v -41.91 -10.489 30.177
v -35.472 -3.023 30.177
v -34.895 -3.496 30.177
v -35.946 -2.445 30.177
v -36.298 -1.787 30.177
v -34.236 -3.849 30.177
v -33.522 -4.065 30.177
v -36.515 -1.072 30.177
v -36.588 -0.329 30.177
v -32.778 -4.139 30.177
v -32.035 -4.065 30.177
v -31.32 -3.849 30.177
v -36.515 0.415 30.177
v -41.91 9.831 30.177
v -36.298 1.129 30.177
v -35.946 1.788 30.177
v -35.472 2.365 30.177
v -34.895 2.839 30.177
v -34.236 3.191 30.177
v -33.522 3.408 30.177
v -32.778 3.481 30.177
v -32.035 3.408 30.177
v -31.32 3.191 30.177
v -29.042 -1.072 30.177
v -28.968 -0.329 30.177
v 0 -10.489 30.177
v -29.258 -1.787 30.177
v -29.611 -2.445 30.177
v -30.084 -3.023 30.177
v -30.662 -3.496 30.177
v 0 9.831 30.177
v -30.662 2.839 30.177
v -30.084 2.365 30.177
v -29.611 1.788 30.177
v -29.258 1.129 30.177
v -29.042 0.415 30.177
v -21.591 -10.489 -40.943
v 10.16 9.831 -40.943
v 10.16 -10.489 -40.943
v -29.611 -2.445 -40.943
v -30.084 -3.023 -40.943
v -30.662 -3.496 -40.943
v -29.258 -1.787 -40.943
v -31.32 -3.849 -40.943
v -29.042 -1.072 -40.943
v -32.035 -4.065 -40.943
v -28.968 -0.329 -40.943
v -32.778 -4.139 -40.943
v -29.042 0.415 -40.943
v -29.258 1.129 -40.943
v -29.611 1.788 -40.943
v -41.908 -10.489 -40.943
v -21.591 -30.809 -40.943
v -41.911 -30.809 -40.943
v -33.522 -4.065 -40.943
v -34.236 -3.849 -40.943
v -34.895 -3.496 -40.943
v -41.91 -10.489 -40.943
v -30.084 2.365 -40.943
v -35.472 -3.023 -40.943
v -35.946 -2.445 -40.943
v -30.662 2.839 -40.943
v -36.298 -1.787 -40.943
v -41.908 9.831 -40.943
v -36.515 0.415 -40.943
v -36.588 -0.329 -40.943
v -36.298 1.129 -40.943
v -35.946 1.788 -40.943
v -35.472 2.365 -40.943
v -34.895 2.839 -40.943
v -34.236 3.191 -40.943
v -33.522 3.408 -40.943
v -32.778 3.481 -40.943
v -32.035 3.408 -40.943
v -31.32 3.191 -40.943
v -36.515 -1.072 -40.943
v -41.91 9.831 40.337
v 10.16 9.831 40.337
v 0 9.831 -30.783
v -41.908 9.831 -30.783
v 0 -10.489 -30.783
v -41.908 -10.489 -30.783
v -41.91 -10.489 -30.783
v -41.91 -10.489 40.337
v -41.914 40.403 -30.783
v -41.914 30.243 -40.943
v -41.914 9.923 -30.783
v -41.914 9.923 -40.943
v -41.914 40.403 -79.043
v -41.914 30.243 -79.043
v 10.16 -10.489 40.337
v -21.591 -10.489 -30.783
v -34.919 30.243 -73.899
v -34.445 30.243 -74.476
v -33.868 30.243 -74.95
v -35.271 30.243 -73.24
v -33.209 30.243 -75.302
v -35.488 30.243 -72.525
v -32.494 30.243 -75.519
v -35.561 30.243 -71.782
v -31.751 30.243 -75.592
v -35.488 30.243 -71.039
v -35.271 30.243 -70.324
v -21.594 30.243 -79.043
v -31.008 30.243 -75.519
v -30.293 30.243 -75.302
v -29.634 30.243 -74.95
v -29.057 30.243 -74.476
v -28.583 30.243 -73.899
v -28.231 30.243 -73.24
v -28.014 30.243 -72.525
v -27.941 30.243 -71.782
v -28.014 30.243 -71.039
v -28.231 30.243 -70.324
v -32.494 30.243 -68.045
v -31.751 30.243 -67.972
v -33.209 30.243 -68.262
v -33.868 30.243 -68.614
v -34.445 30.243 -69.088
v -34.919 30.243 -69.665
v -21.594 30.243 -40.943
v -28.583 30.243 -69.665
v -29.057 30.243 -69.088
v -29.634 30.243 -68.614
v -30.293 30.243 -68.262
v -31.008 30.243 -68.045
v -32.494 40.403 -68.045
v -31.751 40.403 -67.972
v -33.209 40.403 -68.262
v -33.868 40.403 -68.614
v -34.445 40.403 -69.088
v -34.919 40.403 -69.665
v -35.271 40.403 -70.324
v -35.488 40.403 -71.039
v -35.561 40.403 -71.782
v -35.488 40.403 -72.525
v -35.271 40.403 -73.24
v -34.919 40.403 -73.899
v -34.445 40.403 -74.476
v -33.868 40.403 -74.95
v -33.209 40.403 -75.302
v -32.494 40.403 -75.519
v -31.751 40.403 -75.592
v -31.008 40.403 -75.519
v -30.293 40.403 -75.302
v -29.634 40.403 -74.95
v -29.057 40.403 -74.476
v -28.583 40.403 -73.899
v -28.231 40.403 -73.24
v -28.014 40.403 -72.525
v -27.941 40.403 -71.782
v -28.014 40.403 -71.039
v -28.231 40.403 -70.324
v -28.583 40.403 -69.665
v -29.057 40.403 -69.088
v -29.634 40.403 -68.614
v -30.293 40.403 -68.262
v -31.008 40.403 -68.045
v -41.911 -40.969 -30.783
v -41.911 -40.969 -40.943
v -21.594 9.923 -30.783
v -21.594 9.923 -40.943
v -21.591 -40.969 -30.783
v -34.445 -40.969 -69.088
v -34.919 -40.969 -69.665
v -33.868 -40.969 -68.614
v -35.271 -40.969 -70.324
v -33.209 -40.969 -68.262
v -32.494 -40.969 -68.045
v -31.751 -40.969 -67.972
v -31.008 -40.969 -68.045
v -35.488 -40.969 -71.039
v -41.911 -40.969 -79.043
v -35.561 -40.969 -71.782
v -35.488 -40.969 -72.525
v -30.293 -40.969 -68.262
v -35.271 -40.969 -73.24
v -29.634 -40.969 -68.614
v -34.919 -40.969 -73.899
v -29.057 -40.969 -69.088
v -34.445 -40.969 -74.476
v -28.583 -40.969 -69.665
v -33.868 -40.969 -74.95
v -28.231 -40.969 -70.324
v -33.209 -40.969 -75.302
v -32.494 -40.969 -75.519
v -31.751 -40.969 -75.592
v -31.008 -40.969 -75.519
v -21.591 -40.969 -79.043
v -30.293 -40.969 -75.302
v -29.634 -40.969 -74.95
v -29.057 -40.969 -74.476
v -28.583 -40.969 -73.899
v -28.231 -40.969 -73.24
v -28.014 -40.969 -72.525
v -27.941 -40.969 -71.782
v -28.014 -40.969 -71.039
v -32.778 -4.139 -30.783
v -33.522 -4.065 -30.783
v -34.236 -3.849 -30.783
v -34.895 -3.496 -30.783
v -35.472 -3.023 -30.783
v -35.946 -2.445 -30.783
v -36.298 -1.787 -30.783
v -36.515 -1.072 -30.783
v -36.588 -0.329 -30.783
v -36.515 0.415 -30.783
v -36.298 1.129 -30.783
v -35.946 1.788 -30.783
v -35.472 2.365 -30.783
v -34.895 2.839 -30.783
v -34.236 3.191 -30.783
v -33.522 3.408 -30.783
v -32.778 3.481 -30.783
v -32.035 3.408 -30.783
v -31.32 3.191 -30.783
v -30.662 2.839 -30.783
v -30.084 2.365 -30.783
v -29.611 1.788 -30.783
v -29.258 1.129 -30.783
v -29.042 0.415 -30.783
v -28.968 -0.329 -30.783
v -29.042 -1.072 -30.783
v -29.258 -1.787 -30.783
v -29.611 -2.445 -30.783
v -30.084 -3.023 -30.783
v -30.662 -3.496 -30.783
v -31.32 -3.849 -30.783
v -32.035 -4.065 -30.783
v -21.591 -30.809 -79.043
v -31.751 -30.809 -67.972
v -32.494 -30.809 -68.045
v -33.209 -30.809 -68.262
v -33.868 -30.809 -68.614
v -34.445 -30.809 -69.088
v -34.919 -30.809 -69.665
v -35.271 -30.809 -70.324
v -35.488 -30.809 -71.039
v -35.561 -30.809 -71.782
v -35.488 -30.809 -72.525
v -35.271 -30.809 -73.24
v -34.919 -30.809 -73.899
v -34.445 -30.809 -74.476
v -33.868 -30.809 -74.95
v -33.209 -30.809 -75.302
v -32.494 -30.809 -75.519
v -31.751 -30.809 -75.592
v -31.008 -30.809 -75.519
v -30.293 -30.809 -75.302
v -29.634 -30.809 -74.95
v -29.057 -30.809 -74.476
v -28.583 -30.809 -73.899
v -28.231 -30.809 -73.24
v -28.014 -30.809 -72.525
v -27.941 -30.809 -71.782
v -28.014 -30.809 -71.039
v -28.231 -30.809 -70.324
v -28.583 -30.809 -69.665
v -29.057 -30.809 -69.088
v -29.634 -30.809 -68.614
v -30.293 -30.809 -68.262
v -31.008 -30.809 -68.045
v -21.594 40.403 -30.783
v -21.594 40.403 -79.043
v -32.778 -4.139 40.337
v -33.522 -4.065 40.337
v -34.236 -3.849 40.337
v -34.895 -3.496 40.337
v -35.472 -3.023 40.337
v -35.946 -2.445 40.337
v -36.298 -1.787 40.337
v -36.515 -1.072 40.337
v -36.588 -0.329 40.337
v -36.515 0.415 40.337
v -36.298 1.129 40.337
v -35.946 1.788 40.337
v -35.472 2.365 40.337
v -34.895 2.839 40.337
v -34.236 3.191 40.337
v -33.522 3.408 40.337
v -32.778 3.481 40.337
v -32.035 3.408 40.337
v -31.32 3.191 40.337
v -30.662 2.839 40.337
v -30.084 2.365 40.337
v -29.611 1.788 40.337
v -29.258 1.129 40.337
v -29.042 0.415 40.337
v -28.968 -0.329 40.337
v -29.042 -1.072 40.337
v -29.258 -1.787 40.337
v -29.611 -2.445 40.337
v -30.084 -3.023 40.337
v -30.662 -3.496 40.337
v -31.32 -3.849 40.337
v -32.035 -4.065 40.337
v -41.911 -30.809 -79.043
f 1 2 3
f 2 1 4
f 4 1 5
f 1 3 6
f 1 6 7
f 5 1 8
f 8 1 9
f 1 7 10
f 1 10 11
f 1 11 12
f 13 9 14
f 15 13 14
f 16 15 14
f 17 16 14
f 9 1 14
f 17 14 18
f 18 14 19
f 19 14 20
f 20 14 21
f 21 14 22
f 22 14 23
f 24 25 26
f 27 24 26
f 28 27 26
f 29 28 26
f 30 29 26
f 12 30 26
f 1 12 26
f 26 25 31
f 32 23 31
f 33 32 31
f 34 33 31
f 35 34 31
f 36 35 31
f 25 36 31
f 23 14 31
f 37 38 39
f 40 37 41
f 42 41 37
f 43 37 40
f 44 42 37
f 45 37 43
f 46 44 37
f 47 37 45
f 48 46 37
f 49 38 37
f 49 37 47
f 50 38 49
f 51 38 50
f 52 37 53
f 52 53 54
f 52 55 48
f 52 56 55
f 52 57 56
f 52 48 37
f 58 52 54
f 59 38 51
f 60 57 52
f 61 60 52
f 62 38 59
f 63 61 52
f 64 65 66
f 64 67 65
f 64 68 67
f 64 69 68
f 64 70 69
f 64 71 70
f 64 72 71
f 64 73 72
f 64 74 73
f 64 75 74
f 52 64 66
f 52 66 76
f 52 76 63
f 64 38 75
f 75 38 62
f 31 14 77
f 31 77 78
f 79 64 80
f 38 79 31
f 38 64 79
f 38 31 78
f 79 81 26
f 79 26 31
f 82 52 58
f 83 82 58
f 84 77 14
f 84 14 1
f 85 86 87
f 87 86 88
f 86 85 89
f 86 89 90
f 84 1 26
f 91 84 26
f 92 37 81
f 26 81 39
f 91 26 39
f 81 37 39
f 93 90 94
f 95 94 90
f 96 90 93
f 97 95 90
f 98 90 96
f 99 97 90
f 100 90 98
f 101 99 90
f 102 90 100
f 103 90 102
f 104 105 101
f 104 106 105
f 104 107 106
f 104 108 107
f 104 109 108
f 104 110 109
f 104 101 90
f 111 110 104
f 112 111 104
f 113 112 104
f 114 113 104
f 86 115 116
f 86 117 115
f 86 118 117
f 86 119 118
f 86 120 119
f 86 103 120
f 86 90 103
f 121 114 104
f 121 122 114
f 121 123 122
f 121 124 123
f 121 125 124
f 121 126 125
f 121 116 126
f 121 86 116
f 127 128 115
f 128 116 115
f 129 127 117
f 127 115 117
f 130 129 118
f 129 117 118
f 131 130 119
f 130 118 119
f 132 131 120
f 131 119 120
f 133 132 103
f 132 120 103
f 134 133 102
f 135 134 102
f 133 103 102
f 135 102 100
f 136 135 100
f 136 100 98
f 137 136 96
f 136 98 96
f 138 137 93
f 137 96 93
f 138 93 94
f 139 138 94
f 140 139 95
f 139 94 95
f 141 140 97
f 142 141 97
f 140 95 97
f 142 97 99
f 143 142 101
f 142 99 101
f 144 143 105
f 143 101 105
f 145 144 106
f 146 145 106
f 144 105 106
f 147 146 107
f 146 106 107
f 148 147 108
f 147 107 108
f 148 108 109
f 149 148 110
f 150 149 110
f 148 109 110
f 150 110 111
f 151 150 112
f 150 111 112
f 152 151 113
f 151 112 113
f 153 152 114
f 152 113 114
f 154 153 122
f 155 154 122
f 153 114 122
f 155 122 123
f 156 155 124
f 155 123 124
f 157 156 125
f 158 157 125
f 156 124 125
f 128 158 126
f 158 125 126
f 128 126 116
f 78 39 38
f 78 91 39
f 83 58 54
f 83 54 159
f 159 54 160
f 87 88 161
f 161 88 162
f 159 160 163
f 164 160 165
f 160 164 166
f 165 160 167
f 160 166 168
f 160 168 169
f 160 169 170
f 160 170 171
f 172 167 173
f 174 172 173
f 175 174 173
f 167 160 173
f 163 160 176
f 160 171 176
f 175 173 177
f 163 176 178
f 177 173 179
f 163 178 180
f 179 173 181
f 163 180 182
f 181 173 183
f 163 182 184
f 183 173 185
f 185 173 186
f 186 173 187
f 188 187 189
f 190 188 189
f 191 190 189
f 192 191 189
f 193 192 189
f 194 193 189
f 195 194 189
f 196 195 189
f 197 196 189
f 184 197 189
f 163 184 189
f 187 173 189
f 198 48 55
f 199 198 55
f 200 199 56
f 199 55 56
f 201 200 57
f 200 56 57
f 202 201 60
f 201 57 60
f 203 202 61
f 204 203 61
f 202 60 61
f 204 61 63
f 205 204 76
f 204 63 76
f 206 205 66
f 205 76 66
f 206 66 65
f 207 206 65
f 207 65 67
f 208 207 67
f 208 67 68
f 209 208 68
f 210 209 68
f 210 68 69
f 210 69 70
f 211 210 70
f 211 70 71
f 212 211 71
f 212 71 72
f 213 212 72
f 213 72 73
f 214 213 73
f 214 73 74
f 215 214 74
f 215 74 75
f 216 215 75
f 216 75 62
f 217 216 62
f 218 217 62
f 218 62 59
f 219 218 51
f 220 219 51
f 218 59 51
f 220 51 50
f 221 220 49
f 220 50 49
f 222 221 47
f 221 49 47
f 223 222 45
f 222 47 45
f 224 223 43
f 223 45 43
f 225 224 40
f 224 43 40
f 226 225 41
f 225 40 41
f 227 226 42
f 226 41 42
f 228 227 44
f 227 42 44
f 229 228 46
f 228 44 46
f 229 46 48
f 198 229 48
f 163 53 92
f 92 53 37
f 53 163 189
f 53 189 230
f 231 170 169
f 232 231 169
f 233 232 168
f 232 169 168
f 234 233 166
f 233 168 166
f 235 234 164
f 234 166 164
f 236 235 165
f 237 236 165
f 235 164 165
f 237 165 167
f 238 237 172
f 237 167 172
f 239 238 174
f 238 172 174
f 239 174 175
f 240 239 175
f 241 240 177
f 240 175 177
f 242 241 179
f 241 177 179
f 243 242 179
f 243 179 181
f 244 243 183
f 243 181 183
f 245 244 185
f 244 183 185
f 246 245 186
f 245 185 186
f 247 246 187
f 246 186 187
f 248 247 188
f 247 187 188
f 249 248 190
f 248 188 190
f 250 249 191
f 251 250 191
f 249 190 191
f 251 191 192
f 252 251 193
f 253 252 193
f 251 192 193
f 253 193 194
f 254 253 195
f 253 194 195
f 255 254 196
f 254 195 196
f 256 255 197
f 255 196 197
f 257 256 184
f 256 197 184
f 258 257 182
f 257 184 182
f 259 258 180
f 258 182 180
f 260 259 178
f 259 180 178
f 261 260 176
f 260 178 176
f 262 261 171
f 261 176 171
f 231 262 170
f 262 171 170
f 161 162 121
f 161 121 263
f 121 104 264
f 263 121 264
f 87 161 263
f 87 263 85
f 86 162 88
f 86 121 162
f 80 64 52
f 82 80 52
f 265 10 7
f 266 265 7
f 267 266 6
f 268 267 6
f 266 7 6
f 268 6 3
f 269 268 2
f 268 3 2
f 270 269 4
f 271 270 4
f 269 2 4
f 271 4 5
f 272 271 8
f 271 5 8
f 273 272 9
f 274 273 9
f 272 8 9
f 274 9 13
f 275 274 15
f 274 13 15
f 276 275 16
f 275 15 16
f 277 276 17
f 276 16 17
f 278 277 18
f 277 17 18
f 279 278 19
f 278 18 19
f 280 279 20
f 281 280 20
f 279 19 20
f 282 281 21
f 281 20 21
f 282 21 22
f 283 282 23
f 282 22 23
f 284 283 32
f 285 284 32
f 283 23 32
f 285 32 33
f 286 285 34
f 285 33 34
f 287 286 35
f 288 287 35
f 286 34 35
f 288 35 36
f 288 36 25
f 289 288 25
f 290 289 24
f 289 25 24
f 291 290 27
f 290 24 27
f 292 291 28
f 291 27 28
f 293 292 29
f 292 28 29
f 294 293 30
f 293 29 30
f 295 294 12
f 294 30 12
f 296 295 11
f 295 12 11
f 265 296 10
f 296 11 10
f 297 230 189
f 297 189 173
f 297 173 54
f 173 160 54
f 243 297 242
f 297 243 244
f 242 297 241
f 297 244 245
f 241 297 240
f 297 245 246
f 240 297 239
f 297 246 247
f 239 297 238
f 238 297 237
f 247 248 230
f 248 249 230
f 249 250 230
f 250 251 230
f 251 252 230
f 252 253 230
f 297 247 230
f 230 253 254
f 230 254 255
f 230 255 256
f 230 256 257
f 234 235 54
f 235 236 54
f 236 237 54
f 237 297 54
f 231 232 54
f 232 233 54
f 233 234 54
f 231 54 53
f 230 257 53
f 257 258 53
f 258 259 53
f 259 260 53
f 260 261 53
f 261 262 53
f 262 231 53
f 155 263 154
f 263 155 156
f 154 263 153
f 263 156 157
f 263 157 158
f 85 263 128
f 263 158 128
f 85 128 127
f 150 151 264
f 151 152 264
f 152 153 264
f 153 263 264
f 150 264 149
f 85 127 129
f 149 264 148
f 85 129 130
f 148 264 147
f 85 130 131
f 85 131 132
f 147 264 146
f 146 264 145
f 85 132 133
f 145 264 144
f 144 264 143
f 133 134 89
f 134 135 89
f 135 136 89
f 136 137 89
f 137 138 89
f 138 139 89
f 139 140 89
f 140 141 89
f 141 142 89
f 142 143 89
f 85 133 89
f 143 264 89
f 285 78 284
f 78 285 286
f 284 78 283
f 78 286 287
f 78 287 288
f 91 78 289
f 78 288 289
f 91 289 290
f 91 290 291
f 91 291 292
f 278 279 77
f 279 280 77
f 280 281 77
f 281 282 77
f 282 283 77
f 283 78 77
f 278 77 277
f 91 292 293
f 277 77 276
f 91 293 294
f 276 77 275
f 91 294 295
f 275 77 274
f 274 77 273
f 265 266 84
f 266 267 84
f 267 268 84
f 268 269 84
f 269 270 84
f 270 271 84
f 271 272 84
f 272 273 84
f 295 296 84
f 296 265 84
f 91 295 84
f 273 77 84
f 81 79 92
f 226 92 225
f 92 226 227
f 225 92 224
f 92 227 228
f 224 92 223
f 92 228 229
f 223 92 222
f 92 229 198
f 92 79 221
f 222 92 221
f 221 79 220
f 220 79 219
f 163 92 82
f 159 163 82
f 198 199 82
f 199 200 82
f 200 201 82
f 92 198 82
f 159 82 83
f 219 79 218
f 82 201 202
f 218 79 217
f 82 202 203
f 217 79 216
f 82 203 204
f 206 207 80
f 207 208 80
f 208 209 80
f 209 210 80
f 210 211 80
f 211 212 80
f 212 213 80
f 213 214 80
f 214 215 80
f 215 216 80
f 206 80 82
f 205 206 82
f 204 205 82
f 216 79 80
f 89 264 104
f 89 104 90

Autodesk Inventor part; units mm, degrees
ref_plane "YZ Plane" through (0, 0, 0) normal (1, 0, 0) x (0, 1, 0)
ref_plane "XZ Plane" through (0, 0, 0) normal (0, 1, 0) x (-1, 0, 0)
ref_plane "XY Plane" through (0, 0, 0) normal (0, 0, 1) x (1, 0, 0)
sketch "Sketch1" plane through (0, 0, 0) normal (1, 0, 0) x (0, 1, 0)
  line L0 (9.8314, 40.3372) -> (-10.4886, 40.3372)
  line L1 (-10.4886, 40.3372) -> (-10.4886, -40.9428)
  line L2 (-10.4886, -40.9428) -> (9.8314, -40.9428)
  line L3 (9.8314, -40.9428) -> (9.8314, 40.3372)
  point P0 (0, 0)
  dimension "d0" = 20.32
  dimension "d1" = 81.28
extrude "Extrusion1" add sketch "Sketch1" along normal blind 10.16
sketch "Sketch2" plane through (0, -10.4886, 40.3372) normal (0, 0, 1) x (1, 0, 0)
  point P0 (0, 10.4886)
sketch "Sketch3" plane through (0, -10.4886, 40.3372) normal (0, 0, 1) x (1, 0, 0)
  line L0 (10.16, 0) -> (10.16, 20.32) projected
  line L1 (10.16, 20.32) -> (-41.91, 20.32)
  line L2 (-41.91, 20.32) -> (-41.91, 0)
  line L3 (-41.91, 0) -> (10.16, 0)
  line L4 (10.16, 0) -> (10.16, 20.32)
  point P0 (0, 10.4886)
  dimension "d4" = 52.07
extrude "Extrusion2" add sketch "Sketch3" against normal blind 10.16
sketch "Sketch4" plane through (0, -10.4886, -40.9428) normal (0, 0, -1) x (-1, 0, 0)
  line L0 (41.91, 20.32) -> (-10.16, 20.32) projected
  line L1 (41.91, 0) -> (-10.16, 0) projected
  line L2 (-10.16, 20.32) -> (21.59, 20.32)
  line L3 (21.59, 20.32) -> (21.59, 0)
  line L4 (21.59, 0) -> (-10.16, 0)
  line L5 (-10.16, 0) -> (-10.16, 20.32)
  point P0 (0, 10.4886)
  dimension "d7" = 31.75
extrude "Extrusion3" add sketch "Sketch4" against normal blind 10.16
sketch "Sketch5" plane through (10.16, -10.4886, -40.9428) normal (0, 0, -1) x (-1, 0, 0)
  point P0 (10.16, 10.4886)
sketch "Sketch6" plane through (10.16, -10.4886, -40.9428) normal (0, 0, -1) x (-1, 0, 0)
  line L0 (52.07, 20.32) -> (10.16, 20.32) projected
  line L1 (31.7479, 20.32) -> (52.0679, 20.32)
  line L2 (52.0679, 20.32) -> (52.0679, 0)
  line L3 (52.0679, 0) -> (31.7479, 0)
  line L4 (31.7479, 0) -> (31.7479, 20.32)
  point P0 (10.16, 10.4886)
  dimension "d10" = 20.32
  dimension "d11" = 20.32
sketch "Sketch7" plane through (10.16, -10.4886, -40.9428) normal (0, 0, -1) x (-1, 0, 0)
  line L0 (31.7541, 50.8916) -> (52.0741, 50.8916)
  line L1 (52.0741, 50.8916) -> (52.0741, 20.4116)
  line L2 (52.0741, 20.4116) -> (31.7541, 20.4116)
  line L3 (31.7541, 20.4116) -> (31.7541, 50.8916)
  point P0 (10.16, 10.4886)
  dimension "d12" = 20.32
  dimension "d13" = 30.48
sketch "Sketch8" plane through (10.16, -10.4886, -40.9428) normal (0, 0, -1) x (-1, 0, 0)
  line L0 (10.16, 0) -> (52.07, 0) projected
  line L1 (31.7509, 0) -> (52.0709, 0)
  line L2 (52.0709, 0) -> (52.0709, -30.48)
  line L3 (52.0709, -30.48) -> (31.7509, -30.48)
  line L4 (31.7509, -30.48) -> (31.7509, 0)
  point P0 (10.16, 10.4886)
  dimension "d14" = 20.32
  dimension "d15" = 30.48
extrude "Extrusion4" add sketch "Sketch7" against normal blind 10.16
extrude "Extrusion5" add sketch "Sketch8" against normal blind 10.16
extrude "Extrusion6" add sketch "Sketch6" against normal blind 10.16
sketch "Sketch9" plane through (10.16, -10.4886, -40.9428) normal (0, 0, -1) x (-1, 0, 0)
  line L0 (31.7541, 20.4116) -> (31.7541, 50.8916) projected
  line L1 (31.7541, 50.8916) -> (52.0741, 50.8916)
  line L2 (52.0741, 50.8916) -> (52.0741, 40.7316)
  line L3 (52.0741, 40.7316) -> (31.7541, 40.7316)
  line L4 (31.7541, 40.7316) -> (31.7541, 50.8916)
  line L5 (31.7509, -30.48) -> (31.7509, 0) projected
  line L6 (31.7509, -30.48) -> (52.0709, -30.48)
  line L7 (52.0709, -30.48) -> (52.0709, -20.32)
  line L8 (52.0709, -20.32) -> (31.7509, -20.32)
  line L9 (31.7509, -20.32) -> (31.7509, -30.48)
  point P0 (10.16, 10.4886)
  dimension "d22" = 20.32
  dimension "d23" = 10.16
  dimension "d24" = 20.32
  dimension "d25" = 10.16
extrude "Extrusion7" add sketch "Sketch9" along normal blind 38.1
sketch "Sketch10" plane through (-41.9141, 40.4029, -30.7828) normal (0, 1, 0) x (1, 0, 0)
  line L0 (0.0032, 48.26) -> (20.3232, 48.26) projected
  circle A0 centre (10.1632, 40.9995) radius 3.81
  point P0 (41.9141, -30.7828)
  point P1 (10.1632, 48.26)
  dimension "d28" = 7.62
hole "Hole1" at (-31.7509, 40.4029, -71.7822) direction (0, -1, 0) diameter 7.62 depth 89.3191 tip angle 118
sketch "Sketch11" plane through (10.16, -10.4886, 40.3372) normal (0, 0, 1) x (1, 0, 0)
  circle A0 centre (-42.9384, 10.16) radius 3.81
  point P0 (-10.16, 10.4886)
  dimension "d36" = 7.62
hole "Hole2" at (-32.7784, -0.3286, 40.3372) direction (0, 0, -1) diameter 7.62 depth 89.3191 tip angle 118
equation "\"d29\" = d28"
equation "\"d37\" = d28"
properties part number "Part1_New"
